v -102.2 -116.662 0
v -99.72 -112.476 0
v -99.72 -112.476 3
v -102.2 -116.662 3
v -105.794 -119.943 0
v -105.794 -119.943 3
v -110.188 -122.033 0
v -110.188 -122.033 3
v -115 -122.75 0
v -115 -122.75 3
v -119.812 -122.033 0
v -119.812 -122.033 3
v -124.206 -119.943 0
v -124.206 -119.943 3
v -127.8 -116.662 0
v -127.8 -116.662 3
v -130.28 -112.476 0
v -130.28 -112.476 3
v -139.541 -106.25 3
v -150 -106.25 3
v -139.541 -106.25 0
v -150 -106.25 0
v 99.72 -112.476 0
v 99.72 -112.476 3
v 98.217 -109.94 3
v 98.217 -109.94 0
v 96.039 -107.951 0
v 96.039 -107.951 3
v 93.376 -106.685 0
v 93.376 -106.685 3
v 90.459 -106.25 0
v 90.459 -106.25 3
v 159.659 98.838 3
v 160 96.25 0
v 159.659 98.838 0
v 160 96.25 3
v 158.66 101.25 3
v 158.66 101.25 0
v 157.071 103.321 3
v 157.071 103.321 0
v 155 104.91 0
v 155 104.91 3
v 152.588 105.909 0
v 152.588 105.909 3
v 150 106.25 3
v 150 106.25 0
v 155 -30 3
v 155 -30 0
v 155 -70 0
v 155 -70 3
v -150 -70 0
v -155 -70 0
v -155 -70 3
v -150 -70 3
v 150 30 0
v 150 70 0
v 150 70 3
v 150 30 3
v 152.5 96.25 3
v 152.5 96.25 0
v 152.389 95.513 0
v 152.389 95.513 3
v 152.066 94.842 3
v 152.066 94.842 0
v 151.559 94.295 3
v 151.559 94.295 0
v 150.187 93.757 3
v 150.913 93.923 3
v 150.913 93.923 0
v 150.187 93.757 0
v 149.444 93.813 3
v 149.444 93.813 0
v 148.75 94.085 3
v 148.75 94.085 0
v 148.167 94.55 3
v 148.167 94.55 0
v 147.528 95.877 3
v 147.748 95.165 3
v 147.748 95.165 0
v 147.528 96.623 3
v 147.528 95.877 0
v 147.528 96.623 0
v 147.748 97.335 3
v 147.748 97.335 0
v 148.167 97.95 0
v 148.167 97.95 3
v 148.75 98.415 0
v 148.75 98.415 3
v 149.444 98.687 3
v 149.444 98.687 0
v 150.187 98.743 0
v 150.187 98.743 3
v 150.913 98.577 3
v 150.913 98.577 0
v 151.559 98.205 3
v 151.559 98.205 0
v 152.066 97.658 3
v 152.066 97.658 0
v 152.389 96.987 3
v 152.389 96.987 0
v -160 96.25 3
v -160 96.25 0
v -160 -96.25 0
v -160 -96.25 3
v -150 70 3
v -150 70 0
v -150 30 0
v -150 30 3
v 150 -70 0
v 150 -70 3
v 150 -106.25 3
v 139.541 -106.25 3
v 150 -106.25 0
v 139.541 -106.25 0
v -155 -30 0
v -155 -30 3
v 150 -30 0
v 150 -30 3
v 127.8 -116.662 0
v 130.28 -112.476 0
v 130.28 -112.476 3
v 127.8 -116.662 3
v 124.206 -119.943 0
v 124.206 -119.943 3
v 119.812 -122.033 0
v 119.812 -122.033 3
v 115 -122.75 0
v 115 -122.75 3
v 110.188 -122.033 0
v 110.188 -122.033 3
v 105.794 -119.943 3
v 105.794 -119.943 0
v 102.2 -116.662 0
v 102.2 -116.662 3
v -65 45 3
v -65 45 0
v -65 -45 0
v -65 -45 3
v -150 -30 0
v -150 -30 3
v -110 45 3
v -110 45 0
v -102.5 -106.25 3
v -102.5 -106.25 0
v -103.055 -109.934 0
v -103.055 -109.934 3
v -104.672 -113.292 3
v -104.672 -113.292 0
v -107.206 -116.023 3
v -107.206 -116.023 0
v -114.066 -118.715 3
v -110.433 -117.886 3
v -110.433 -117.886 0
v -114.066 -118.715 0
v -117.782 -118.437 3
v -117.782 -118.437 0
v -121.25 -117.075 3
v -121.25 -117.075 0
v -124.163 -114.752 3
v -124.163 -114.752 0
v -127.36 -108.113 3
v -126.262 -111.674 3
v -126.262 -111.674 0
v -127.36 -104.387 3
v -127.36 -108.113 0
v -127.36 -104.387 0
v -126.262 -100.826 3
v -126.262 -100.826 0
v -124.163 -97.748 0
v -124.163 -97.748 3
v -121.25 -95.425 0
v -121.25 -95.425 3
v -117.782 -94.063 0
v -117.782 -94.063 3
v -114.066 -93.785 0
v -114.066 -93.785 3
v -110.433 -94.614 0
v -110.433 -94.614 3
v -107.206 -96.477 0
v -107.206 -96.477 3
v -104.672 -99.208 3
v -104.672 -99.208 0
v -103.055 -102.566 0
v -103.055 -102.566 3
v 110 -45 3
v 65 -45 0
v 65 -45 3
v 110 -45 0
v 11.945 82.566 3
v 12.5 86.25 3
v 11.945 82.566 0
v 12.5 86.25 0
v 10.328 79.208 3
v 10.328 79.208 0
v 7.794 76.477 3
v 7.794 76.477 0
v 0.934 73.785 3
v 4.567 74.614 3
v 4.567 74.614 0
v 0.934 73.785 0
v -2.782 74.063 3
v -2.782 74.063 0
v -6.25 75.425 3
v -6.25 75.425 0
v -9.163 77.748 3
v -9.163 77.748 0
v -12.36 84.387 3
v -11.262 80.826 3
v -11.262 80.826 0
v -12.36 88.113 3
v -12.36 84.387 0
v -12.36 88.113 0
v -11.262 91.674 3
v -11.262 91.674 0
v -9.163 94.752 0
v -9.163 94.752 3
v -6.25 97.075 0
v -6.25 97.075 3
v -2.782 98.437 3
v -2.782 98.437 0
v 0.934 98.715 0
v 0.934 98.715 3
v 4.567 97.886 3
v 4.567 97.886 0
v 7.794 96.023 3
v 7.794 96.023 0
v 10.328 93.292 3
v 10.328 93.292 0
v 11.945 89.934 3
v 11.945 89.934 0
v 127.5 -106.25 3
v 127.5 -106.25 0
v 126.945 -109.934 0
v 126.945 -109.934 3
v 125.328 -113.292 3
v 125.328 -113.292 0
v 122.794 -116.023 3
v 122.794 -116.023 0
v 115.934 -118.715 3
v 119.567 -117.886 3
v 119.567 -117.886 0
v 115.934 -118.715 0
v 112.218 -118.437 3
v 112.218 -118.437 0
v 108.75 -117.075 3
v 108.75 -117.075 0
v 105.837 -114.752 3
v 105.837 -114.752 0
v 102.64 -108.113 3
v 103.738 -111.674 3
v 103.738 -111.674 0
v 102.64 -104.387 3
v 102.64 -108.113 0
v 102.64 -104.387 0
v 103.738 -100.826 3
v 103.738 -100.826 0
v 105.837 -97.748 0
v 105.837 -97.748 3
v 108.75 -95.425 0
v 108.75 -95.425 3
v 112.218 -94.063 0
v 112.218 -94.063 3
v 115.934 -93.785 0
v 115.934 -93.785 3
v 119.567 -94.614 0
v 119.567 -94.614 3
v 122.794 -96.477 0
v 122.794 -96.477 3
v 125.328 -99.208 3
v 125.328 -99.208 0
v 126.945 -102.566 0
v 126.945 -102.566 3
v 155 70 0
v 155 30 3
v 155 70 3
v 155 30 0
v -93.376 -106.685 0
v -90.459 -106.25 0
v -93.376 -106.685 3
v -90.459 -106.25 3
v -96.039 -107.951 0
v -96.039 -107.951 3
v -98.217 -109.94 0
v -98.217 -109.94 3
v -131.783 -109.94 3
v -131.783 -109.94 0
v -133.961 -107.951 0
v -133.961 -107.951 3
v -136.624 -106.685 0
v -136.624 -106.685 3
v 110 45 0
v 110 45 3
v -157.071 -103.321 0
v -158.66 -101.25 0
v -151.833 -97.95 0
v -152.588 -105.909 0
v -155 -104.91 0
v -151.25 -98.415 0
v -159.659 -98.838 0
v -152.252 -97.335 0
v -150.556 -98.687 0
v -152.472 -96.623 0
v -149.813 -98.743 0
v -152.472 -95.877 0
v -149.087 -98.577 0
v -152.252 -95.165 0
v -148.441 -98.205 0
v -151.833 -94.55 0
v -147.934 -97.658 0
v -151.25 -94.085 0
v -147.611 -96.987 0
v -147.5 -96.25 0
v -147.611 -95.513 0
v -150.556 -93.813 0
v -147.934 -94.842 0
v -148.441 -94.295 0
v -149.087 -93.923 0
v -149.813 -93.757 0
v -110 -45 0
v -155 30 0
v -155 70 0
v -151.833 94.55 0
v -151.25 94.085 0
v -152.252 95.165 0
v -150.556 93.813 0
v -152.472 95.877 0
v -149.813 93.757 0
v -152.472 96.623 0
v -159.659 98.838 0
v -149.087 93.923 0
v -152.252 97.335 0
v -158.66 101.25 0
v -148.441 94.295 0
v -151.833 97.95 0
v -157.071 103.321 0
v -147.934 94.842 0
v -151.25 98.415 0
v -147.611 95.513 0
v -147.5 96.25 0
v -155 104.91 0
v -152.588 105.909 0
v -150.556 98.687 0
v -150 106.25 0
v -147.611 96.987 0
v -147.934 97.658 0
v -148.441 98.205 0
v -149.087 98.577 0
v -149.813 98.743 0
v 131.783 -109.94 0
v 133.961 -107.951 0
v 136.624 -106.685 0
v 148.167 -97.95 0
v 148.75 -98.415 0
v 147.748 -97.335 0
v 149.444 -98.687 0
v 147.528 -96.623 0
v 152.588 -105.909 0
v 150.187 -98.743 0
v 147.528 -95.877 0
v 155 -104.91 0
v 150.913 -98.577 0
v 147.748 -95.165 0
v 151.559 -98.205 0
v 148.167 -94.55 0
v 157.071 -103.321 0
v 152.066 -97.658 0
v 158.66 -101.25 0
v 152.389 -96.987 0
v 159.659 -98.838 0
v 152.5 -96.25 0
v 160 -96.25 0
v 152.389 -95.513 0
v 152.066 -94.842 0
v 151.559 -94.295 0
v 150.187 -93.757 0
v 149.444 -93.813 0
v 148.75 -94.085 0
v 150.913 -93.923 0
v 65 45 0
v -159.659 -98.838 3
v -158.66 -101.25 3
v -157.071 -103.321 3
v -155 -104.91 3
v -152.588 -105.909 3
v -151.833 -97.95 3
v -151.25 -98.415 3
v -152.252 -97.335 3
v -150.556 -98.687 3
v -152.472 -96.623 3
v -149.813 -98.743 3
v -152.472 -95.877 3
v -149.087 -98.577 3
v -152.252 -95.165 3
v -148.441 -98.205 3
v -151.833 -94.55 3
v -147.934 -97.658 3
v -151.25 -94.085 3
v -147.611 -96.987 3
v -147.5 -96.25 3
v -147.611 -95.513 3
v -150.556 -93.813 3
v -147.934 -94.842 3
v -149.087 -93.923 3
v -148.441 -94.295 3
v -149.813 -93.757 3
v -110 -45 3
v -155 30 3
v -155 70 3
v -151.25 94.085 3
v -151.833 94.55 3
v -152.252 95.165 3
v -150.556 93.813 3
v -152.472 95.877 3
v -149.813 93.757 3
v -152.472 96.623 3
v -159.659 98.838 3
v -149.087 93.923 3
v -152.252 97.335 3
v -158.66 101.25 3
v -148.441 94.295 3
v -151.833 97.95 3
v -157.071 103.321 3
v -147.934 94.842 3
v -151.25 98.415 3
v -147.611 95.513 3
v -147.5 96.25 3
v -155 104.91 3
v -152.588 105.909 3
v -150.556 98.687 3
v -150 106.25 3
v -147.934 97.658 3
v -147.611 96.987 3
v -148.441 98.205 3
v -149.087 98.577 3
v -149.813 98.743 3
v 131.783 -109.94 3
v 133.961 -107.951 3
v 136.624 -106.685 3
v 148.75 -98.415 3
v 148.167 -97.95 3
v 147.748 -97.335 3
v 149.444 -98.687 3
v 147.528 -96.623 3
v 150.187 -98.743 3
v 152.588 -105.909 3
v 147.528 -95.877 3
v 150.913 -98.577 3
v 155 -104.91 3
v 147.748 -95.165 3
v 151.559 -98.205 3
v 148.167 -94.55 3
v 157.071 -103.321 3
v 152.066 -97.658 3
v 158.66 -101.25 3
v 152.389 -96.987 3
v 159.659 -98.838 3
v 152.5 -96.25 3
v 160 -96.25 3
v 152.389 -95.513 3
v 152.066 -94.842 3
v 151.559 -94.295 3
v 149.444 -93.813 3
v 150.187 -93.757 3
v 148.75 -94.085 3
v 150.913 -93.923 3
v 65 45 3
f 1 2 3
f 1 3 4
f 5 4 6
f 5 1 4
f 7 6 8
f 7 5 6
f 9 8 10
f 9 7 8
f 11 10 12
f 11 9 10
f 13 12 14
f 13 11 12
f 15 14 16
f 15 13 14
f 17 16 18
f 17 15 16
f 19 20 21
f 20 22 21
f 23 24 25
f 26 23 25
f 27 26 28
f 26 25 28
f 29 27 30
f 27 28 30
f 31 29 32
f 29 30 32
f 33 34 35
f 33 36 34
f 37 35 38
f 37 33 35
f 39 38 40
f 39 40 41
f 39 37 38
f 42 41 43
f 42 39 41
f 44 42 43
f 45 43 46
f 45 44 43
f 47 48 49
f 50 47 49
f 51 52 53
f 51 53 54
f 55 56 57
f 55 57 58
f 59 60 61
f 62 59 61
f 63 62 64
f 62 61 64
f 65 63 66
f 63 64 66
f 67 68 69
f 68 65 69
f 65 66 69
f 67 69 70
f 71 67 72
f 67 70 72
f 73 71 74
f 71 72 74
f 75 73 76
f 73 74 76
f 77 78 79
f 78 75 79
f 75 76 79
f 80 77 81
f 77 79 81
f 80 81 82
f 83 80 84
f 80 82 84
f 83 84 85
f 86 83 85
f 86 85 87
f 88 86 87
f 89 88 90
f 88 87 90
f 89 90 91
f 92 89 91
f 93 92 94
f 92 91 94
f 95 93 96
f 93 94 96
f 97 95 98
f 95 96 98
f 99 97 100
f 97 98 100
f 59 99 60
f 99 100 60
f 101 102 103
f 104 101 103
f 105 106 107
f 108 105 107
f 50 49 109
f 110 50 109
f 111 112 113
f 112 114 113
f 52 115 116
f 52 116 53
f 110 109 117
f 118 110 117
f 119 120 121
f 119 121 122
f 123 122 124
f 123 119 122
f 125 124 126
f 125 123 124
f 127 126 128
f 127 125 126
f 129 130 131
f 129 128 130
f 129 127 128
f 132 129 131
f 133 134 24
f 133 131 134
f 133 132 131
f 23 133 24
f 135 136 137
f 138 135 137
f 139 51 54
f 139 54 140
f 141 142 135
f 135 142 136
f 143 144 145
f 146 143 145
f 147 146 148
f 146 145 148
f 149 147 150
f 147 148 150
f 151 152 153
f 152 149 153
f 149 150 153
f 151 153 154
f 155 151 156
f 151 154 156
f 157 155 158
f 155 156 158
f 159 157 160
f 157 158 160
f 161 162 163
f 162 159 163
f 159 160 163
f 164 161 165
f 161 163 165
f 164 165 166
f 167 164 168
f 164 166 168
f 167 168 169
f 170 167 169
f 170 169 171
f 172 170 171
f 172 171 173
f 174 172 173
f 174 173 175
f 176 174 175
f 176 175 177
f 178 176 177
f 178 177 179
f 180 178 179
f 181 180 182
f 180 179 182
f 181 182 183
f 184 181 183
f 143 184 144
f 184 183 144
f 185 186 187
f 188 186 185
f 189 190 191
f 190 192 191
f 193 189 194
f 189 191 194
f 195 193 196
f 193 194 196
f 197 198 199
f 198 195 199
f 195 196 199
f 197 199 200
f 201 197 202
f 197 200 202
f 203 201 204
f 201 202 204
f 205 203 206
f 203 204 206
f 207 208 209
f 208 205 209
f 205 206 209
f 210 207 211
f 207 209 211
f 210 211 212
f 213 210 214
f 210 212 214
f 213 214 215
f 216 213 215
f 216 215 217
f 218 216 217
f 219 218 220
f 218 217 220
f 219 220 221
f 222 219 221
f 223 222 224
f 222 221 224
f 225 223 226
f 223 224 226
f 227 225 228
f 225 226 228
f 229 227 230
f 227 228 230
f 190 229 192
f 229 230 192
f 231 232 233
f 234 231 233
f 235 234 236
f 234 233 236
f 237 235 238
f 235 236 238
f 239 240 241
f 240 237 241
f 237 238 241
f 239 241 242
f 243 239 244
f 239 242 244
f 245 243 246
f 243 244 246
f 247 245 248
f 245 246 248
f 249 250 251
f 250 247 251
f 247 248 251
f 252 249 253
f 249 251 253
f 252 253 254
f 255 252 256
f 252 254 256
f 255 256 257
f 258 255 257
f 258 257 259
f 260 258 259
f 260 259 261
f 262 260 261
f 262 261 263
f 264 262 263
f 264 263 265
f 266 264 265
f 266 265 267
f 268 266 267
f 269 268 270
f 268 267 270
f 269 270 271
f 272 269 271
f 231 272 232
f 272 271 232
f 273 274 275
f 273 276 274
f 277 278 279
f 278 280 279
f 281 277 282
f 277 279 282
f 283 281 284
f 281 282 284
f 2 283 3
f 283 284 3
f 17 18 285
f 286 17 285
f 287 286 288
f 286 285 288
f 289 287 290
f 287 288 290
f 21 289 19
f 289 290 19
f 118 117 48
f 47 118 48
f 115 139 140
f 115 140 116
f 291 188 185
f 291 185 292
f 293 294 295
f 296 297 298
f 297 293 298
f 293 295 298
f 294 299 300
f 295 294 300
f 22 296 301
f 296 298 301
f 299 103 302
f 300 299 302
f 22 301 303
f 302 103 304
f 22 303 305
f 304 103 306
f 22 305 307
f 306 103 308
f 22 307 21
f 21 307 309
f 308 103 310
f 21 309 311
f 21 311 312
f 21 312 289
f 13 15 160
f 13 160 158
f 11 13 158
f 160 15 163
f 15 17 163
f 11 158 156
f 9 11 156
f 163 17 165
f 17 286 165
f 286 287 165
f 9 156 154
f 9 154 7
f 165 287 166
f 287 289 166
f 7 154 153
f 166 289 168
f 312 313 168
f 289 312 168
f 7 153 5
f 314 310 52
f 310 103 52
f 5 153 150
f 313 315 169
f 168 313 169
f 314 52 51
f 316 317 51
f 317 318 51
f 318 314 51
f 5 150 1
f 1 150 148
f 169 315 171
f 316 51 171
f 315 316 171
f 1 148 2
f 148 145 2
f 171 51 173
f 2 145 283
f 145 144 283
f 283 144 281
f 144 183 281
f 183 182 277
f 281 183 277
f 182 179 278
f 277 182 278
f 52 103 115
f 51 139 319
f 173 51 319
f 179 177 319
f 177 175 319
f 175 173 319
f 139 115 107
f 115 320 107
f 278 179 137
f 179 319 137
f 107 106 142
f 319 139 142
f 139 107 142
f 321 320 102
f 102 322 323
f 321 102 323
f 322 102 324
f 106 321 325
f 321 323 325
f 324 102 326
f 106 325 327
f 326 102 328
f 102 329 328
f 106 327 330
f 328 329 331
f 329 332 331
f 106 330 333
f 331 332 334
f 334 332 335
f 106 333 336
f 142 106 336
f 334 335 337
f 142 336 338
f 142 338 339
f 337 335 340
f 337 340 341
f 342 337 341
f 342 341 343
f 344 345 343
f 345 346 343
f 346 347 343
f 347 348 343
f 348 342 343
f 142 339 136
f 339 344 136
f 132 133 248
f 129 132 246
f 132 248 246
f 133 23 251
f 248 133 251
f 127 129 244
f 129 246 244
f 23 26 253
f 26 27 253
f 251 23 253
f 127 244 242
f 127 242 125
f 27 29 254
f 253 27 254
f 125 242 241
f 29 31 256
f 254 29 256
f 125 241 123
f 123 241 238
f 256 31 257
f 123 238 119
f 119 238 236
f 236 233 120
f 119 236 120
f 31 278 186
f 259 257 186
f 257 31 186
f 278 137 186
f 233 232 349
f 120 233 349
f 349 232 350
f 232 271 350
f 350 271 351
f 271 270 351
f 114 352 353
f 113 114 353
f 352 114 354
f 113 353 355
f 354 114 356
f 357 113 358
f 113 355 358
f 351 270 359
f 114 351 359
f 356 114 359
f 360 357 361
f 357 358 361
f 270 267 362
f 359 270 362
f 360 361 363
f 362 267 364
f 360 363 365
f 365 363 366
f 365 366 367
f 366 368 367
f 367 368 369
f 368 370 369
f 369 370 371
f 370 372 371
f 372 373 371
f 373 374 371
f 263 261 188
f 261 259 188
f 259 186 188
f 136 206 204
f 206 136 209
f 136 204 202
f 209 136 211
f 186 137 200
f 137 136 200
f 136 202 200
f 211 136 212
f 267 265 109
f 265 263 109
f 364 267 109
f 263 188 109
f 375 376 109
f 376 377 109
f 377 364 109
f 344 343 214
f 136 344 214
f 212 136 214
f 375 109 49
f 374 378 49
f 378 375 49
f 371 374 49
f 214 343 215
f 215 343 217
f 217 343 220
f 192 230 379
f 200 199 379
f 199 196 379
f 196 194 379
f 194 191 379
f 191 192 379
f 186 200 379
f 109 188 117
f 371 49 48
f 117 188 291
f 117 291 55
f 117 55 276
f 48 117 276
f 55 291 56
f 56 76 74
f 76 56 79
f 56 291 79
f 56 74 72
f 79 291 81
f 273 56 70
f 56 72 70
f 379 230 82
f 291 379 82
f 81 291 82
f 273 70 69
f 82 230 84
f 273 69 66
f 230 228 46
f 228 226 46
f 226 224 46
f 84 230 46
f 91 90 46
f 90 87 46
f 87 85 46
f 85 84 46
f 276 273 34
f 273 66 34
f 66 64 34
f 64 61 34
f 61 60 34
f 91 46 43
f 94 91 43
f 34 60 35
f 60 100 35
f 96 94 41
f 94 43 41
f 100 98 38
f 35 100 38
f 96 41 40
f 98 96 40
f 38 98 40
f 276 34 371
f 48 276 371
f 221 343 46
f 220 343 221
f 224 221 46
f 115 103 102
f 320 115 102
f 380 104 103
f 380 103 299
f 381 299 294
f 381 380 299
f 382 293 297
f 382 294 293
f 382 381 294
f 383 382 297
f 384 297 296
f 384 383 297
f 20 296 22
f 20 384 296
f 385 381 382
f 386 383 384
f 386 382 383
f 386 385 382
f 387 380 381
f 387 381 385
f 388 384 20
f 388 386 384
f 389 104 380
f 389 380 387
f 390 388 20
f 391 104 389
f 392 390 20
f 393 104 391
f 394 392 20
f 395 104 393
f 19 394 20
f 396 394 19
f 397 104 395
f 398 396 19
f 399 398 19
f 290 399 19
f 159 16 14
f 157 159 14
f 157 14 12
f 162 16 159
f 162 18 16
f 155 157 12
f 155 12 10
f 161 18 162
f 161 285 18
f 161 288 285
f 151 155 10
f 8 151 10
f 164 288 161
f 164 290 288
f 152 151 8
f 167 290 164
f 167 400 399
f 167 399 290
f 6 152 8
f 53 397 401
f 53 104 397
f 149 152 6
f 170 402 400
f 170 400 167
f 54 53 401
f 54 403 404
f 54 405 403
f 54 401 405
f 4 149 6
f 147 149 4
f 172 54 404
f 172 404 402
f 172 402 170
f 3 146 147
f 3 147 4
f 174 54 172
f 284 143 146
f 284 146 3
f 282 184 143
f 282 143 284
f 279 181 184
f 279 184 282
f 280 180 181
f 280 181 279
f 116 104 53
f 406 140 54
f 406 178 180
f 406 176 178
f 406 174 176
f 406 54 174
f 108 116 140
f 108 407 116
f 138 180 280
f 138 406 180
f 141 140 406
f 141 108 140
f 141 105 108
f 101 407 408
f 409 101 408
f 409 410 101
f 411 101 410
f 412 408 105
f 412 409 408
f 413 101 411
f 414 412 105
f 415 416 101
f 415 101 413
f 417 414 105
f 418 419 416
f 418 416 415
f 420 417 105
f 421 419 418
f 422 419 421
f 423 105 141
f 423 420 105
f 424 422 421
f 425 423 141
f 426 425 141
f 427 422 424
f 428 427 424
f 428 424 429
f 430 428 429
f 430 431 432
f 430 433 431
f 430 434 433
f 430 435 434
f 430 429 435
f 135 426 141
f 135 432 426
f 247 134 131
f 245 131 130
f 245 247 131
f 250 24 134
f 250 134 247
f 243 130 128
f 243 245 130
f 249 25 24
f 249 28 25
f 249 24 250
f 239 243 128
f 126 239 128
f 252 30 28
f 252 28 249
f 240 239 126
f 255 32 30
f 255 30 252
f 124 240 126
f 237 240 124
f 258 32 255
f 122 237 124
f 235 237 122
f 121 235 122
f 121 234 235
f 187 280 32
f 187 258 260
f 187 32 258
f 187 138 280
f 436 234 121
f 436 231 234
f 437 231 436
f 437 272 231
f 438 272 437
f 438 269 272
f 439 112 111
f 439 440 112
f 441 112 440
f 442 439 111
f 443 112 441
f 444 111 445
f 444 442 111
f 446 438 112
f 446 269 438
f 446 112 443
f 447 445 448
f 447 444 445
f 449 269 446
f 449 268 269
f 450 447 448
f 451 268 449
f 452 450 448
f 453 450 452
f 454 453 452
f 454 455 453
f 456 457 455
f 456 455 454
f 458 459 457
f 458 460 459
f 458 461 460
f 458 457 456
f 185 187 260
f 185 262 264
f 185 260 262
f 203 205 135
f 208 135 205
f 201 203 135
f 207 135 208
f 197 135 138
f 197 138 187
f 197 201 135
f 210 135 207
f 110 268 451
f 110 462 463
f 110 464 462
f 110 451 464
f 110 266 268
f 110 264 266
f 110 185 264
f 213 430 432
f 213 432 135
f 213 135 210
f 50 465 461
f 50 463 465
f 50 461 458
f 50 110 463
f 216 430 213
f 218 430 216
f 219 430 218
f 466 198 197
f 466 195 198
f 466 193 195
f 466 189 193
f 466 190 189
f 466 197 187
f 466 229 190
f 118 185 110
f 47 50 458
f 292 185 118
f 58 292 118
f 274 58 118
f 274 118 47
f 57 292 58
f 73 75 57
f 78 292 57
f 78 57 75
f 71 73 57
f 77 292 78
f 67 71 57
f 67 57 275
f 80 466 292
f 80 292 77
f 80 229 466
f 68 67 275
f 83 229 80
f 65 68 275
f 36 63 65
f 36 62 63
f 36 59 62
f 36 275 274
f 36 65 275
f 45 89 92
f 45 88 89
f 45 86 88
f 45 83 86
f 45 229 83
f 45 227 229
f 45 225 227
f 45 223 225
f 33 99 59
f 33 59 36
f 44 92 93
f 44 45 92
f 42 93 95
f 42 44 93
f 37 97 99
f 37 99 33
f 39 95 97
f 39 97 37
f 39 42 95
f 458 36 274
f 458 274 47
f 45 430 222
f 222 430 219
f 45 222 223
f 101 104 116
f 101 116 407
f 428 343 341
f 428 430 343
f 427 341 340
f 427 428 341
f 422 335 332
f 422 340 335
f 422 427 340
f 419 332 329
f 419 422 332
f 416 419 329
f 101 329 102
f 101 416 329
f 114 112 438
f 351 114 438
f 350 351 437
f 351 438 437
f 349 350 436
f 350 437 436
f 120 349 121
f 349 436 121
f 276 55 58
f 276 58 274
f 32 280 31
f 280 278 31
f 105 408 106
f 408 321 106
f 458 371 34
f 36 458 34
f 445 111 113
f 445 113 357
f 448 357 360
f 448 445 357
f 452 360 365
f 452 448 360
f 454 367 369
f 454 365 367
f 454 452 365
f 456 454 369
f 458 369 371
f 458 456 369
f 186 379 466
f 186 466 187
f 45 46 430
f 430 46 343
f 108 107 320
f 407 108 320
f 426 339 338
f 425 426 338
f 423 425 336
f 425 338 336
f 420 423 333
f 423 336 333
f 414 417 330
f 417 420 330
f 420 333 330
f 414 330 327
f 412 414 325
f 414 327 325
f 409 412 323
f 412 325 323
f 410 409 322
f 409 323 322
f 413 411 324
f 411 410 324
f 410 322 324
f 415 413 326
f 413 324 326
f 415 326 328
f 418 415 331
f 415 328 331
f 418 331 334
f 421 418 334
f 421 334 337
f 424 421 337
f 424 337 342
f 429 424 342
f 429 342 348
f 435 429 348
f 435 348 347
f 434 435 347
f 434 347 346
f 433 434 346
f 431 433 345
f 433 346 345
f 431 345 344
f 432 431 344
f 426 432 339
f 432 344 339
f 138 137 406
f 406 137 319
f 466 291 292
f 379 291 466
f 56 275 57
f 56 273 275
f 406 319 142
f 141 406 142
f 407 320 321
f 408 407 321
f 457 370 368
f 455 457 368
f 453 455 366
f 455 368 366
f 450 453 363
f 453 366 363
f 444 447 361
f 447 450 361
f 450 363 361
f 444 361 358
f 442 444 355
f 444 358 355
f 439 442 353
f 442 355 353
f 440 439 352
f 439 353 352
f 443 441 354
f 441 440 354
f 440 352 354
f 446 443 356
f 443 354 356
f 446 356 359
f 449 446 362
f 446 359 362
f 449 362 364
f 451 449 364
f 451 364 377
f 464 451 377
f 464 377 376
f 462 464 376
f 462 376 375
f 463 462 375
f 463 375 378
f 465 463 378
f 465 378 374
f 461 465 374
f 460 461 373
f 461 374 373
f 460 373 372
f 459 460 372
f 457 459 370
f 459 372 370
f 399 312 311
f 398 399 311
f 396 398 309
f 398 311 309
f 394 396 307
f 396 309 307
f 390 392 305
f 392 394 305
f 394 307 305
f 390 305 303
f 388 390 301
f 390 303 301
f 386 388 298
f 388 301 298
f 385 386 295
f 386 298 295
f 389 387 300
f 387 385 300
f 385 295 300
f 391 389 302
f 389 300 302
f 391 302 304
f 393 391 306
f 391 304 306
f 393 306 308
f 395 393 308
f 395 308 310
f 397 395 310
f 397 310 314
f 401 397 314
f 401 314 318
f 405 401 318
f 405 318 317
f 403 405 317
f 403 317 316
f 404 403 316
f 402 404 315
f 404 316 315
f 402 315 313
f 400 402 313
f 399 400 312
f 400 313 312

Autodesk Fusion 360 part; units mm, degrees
sketch "Esquisse2" plane through (0, 0, 0) normal (0, 0, 1) x (1, 0, 0)
  line L0 (160, 106.25) -> (-160, 106.25)
  line L1 (-160, 106.25) -> (-160, -106.25)
  line L2 (160, -106.25) -> (160, 106.25)
  line L3 (160, 106.25) -> (-160, -106.25) construction
  line L4 (-160, 106.25) -> (160, -106.25) construction
  line L5 (0, 0) -> (65, 0) construction
  line L6 (95, 45) -> (65, 45)
  line L7 (65, 45) -> (65, -45)
  line L8 (65, -45) -> (95, -45)
  line L9 (95, -45) -> (95, 45)
  line L10 (95, 45) -> (65, -45) construction
  line L11 (65, 45) -> (95, -45) construction
  line L12 (110, 45) -> (95, 45)
  line L13 (95, 45) -> (95, -45)
  line L14 (95, -45) -> (110, -45)
  line L15 (110, -45) -> (110, 45)
  line L16 (110, 45) -> (95, -45) construction
  line L17 (95, 45) -> (110, -45) construction
  circle A0 centre (150, 96.25) radius 2.5
  line L18 (0, 2.5) -> (0, 20)
  circle A1 centre (-150, 96.25) radius 2.5
  circle A2 centre (150, -96.25) radius 2.5
  circle A3 centre (-150, -96.25) radius 2.5
  circle A4 centre (0, 86.25) radius 12.5
  circle A5 centre (115, -106.25) radius 12.5
  line L19 (0, 1.75) -> (0, 22.5)
  circle A6 centre (-115, -106.25) radius 12.5
  arc A7 (-131.5, -106.25) -> (-98.5, -106.25) centre (-115, -106.25) ccw
  line L20 (-160, -106.25) -> (-131.5, -106.25)
  arc A8 (98.5, -106.25) -> (131.5, -106.25) centre (115, -106.25) ccw
  line L21 (-98.5, -106.25) -> (98.5, -106.25)
  line L22 (131.5, -106.25) -> (160, -106.25)
  line L23 (-65, 45) -> (-65, -45)
  line L24 (-95, 45) -> (-65, 45)
  line L25 (-110, 45) -> (-95, 45)
  line L26 (-110, -45) -> (-110, 45)
  line L27 (-95, -45) -> (-110, -45)
  line L28 (-65, -45) -> (-95, -45)
  line L29 (-155, 70) -> (-150, 70)
  line L30 (-150, 70) -> (-150, 30)
  line L31 (-150, 30) -> (-155, 30)
  line L32 (-155, 30) -> (-155, 70)
  line L33 (-155, -30) -> (-155, -70)
  line L34 (-150, -30) -> (-155, -30)
  line L35 (-150, -70) -> (-150, -30)
  line L36 (-155, -70) -> (-150, -70)
  line L37 (150, -70) -> (150, -30)
  line L38 (155, -70) -> (150, -70)
  line L39 (155, -30) -> (155, -70)
  line L40 (150, -30) -> (155, -30)
  line L41 (155, 30) -> (155, 70)
  line L42 (155, 70) -> (150, 70)
  line L43 (150, 70) -> (150, 30)
  line L44 (150, 30) -> (155, 30)
  point P0 (80, 0)
  point P1 (102.5, 0)
  dimension "d39" = 212.5
  dimension "d40" = 65
  dimension "d41" = 50
  dimension "d42" = 30
  dimension "d43" = 15
  dimension "d44" = 90
  dimension "d45" = 90
  dimension "d46" = 5
  dimension "d47" = 10
  dimension "d48" = 10
  dimension "d49" = 25
  dimension "d50" = 20
  dimension "d51" = 25
  dimension "d52" = 45
  dimension "d54" = 4
  dimension "d56" = 4
  dimension "d57" = 28.5
  dimension "d58" = 5
  dimension "d59" = 40
  dimension "d60" = 5
  dimension "d61" = 30
extrude "Extrusion1" add sketch "Esquisse2" along normal blind 3
fillet "Congé1" radius 10 4 edges at (160, -106.25, 1.5) (-160, -106.25, 1.5) (-160, 106.25, 1.5) (160, 106.25, 1.5)
fillet "Congé2" radius 10 4 edges at (131.5, -106.25, 1.5) (98.5, -106.25, 1.5) (-131.5, -106.25, 1.5) (-98.5, -106.25, 1.5)
equation "baseWidth = 250 mm"
equation "baseDepth = ( maxPerimeter - sparePerimeter - 2 * baseWidth ) / 2"
equation "maxPerimeter = ( 2050 / 2 ) * 1 mm"
equation "maxDeployedPerimeter = ( 2200 / 2 ) * 1 mm"
equation "baseRatio = 2 / 3"
equation "sparePerimeter = 100 mm"
equation "baseThickness = 3 mm"
equation "chamferWidth = 30 mm"
equation "motorLength = 65 mm"
equation "wheelHoleWidth = 30 mm"
equation "encoderWheelHoleWidth = 15 mm"
equation "encoderAndSupportWidth = 40 mm"
equation "d39 = baseDepth"
equation "d42 = wheelHoleWidth"
equation "d43 = encoderWheelHoleWidth"
equation "d45 = d44"
equation "d51 = d49"
